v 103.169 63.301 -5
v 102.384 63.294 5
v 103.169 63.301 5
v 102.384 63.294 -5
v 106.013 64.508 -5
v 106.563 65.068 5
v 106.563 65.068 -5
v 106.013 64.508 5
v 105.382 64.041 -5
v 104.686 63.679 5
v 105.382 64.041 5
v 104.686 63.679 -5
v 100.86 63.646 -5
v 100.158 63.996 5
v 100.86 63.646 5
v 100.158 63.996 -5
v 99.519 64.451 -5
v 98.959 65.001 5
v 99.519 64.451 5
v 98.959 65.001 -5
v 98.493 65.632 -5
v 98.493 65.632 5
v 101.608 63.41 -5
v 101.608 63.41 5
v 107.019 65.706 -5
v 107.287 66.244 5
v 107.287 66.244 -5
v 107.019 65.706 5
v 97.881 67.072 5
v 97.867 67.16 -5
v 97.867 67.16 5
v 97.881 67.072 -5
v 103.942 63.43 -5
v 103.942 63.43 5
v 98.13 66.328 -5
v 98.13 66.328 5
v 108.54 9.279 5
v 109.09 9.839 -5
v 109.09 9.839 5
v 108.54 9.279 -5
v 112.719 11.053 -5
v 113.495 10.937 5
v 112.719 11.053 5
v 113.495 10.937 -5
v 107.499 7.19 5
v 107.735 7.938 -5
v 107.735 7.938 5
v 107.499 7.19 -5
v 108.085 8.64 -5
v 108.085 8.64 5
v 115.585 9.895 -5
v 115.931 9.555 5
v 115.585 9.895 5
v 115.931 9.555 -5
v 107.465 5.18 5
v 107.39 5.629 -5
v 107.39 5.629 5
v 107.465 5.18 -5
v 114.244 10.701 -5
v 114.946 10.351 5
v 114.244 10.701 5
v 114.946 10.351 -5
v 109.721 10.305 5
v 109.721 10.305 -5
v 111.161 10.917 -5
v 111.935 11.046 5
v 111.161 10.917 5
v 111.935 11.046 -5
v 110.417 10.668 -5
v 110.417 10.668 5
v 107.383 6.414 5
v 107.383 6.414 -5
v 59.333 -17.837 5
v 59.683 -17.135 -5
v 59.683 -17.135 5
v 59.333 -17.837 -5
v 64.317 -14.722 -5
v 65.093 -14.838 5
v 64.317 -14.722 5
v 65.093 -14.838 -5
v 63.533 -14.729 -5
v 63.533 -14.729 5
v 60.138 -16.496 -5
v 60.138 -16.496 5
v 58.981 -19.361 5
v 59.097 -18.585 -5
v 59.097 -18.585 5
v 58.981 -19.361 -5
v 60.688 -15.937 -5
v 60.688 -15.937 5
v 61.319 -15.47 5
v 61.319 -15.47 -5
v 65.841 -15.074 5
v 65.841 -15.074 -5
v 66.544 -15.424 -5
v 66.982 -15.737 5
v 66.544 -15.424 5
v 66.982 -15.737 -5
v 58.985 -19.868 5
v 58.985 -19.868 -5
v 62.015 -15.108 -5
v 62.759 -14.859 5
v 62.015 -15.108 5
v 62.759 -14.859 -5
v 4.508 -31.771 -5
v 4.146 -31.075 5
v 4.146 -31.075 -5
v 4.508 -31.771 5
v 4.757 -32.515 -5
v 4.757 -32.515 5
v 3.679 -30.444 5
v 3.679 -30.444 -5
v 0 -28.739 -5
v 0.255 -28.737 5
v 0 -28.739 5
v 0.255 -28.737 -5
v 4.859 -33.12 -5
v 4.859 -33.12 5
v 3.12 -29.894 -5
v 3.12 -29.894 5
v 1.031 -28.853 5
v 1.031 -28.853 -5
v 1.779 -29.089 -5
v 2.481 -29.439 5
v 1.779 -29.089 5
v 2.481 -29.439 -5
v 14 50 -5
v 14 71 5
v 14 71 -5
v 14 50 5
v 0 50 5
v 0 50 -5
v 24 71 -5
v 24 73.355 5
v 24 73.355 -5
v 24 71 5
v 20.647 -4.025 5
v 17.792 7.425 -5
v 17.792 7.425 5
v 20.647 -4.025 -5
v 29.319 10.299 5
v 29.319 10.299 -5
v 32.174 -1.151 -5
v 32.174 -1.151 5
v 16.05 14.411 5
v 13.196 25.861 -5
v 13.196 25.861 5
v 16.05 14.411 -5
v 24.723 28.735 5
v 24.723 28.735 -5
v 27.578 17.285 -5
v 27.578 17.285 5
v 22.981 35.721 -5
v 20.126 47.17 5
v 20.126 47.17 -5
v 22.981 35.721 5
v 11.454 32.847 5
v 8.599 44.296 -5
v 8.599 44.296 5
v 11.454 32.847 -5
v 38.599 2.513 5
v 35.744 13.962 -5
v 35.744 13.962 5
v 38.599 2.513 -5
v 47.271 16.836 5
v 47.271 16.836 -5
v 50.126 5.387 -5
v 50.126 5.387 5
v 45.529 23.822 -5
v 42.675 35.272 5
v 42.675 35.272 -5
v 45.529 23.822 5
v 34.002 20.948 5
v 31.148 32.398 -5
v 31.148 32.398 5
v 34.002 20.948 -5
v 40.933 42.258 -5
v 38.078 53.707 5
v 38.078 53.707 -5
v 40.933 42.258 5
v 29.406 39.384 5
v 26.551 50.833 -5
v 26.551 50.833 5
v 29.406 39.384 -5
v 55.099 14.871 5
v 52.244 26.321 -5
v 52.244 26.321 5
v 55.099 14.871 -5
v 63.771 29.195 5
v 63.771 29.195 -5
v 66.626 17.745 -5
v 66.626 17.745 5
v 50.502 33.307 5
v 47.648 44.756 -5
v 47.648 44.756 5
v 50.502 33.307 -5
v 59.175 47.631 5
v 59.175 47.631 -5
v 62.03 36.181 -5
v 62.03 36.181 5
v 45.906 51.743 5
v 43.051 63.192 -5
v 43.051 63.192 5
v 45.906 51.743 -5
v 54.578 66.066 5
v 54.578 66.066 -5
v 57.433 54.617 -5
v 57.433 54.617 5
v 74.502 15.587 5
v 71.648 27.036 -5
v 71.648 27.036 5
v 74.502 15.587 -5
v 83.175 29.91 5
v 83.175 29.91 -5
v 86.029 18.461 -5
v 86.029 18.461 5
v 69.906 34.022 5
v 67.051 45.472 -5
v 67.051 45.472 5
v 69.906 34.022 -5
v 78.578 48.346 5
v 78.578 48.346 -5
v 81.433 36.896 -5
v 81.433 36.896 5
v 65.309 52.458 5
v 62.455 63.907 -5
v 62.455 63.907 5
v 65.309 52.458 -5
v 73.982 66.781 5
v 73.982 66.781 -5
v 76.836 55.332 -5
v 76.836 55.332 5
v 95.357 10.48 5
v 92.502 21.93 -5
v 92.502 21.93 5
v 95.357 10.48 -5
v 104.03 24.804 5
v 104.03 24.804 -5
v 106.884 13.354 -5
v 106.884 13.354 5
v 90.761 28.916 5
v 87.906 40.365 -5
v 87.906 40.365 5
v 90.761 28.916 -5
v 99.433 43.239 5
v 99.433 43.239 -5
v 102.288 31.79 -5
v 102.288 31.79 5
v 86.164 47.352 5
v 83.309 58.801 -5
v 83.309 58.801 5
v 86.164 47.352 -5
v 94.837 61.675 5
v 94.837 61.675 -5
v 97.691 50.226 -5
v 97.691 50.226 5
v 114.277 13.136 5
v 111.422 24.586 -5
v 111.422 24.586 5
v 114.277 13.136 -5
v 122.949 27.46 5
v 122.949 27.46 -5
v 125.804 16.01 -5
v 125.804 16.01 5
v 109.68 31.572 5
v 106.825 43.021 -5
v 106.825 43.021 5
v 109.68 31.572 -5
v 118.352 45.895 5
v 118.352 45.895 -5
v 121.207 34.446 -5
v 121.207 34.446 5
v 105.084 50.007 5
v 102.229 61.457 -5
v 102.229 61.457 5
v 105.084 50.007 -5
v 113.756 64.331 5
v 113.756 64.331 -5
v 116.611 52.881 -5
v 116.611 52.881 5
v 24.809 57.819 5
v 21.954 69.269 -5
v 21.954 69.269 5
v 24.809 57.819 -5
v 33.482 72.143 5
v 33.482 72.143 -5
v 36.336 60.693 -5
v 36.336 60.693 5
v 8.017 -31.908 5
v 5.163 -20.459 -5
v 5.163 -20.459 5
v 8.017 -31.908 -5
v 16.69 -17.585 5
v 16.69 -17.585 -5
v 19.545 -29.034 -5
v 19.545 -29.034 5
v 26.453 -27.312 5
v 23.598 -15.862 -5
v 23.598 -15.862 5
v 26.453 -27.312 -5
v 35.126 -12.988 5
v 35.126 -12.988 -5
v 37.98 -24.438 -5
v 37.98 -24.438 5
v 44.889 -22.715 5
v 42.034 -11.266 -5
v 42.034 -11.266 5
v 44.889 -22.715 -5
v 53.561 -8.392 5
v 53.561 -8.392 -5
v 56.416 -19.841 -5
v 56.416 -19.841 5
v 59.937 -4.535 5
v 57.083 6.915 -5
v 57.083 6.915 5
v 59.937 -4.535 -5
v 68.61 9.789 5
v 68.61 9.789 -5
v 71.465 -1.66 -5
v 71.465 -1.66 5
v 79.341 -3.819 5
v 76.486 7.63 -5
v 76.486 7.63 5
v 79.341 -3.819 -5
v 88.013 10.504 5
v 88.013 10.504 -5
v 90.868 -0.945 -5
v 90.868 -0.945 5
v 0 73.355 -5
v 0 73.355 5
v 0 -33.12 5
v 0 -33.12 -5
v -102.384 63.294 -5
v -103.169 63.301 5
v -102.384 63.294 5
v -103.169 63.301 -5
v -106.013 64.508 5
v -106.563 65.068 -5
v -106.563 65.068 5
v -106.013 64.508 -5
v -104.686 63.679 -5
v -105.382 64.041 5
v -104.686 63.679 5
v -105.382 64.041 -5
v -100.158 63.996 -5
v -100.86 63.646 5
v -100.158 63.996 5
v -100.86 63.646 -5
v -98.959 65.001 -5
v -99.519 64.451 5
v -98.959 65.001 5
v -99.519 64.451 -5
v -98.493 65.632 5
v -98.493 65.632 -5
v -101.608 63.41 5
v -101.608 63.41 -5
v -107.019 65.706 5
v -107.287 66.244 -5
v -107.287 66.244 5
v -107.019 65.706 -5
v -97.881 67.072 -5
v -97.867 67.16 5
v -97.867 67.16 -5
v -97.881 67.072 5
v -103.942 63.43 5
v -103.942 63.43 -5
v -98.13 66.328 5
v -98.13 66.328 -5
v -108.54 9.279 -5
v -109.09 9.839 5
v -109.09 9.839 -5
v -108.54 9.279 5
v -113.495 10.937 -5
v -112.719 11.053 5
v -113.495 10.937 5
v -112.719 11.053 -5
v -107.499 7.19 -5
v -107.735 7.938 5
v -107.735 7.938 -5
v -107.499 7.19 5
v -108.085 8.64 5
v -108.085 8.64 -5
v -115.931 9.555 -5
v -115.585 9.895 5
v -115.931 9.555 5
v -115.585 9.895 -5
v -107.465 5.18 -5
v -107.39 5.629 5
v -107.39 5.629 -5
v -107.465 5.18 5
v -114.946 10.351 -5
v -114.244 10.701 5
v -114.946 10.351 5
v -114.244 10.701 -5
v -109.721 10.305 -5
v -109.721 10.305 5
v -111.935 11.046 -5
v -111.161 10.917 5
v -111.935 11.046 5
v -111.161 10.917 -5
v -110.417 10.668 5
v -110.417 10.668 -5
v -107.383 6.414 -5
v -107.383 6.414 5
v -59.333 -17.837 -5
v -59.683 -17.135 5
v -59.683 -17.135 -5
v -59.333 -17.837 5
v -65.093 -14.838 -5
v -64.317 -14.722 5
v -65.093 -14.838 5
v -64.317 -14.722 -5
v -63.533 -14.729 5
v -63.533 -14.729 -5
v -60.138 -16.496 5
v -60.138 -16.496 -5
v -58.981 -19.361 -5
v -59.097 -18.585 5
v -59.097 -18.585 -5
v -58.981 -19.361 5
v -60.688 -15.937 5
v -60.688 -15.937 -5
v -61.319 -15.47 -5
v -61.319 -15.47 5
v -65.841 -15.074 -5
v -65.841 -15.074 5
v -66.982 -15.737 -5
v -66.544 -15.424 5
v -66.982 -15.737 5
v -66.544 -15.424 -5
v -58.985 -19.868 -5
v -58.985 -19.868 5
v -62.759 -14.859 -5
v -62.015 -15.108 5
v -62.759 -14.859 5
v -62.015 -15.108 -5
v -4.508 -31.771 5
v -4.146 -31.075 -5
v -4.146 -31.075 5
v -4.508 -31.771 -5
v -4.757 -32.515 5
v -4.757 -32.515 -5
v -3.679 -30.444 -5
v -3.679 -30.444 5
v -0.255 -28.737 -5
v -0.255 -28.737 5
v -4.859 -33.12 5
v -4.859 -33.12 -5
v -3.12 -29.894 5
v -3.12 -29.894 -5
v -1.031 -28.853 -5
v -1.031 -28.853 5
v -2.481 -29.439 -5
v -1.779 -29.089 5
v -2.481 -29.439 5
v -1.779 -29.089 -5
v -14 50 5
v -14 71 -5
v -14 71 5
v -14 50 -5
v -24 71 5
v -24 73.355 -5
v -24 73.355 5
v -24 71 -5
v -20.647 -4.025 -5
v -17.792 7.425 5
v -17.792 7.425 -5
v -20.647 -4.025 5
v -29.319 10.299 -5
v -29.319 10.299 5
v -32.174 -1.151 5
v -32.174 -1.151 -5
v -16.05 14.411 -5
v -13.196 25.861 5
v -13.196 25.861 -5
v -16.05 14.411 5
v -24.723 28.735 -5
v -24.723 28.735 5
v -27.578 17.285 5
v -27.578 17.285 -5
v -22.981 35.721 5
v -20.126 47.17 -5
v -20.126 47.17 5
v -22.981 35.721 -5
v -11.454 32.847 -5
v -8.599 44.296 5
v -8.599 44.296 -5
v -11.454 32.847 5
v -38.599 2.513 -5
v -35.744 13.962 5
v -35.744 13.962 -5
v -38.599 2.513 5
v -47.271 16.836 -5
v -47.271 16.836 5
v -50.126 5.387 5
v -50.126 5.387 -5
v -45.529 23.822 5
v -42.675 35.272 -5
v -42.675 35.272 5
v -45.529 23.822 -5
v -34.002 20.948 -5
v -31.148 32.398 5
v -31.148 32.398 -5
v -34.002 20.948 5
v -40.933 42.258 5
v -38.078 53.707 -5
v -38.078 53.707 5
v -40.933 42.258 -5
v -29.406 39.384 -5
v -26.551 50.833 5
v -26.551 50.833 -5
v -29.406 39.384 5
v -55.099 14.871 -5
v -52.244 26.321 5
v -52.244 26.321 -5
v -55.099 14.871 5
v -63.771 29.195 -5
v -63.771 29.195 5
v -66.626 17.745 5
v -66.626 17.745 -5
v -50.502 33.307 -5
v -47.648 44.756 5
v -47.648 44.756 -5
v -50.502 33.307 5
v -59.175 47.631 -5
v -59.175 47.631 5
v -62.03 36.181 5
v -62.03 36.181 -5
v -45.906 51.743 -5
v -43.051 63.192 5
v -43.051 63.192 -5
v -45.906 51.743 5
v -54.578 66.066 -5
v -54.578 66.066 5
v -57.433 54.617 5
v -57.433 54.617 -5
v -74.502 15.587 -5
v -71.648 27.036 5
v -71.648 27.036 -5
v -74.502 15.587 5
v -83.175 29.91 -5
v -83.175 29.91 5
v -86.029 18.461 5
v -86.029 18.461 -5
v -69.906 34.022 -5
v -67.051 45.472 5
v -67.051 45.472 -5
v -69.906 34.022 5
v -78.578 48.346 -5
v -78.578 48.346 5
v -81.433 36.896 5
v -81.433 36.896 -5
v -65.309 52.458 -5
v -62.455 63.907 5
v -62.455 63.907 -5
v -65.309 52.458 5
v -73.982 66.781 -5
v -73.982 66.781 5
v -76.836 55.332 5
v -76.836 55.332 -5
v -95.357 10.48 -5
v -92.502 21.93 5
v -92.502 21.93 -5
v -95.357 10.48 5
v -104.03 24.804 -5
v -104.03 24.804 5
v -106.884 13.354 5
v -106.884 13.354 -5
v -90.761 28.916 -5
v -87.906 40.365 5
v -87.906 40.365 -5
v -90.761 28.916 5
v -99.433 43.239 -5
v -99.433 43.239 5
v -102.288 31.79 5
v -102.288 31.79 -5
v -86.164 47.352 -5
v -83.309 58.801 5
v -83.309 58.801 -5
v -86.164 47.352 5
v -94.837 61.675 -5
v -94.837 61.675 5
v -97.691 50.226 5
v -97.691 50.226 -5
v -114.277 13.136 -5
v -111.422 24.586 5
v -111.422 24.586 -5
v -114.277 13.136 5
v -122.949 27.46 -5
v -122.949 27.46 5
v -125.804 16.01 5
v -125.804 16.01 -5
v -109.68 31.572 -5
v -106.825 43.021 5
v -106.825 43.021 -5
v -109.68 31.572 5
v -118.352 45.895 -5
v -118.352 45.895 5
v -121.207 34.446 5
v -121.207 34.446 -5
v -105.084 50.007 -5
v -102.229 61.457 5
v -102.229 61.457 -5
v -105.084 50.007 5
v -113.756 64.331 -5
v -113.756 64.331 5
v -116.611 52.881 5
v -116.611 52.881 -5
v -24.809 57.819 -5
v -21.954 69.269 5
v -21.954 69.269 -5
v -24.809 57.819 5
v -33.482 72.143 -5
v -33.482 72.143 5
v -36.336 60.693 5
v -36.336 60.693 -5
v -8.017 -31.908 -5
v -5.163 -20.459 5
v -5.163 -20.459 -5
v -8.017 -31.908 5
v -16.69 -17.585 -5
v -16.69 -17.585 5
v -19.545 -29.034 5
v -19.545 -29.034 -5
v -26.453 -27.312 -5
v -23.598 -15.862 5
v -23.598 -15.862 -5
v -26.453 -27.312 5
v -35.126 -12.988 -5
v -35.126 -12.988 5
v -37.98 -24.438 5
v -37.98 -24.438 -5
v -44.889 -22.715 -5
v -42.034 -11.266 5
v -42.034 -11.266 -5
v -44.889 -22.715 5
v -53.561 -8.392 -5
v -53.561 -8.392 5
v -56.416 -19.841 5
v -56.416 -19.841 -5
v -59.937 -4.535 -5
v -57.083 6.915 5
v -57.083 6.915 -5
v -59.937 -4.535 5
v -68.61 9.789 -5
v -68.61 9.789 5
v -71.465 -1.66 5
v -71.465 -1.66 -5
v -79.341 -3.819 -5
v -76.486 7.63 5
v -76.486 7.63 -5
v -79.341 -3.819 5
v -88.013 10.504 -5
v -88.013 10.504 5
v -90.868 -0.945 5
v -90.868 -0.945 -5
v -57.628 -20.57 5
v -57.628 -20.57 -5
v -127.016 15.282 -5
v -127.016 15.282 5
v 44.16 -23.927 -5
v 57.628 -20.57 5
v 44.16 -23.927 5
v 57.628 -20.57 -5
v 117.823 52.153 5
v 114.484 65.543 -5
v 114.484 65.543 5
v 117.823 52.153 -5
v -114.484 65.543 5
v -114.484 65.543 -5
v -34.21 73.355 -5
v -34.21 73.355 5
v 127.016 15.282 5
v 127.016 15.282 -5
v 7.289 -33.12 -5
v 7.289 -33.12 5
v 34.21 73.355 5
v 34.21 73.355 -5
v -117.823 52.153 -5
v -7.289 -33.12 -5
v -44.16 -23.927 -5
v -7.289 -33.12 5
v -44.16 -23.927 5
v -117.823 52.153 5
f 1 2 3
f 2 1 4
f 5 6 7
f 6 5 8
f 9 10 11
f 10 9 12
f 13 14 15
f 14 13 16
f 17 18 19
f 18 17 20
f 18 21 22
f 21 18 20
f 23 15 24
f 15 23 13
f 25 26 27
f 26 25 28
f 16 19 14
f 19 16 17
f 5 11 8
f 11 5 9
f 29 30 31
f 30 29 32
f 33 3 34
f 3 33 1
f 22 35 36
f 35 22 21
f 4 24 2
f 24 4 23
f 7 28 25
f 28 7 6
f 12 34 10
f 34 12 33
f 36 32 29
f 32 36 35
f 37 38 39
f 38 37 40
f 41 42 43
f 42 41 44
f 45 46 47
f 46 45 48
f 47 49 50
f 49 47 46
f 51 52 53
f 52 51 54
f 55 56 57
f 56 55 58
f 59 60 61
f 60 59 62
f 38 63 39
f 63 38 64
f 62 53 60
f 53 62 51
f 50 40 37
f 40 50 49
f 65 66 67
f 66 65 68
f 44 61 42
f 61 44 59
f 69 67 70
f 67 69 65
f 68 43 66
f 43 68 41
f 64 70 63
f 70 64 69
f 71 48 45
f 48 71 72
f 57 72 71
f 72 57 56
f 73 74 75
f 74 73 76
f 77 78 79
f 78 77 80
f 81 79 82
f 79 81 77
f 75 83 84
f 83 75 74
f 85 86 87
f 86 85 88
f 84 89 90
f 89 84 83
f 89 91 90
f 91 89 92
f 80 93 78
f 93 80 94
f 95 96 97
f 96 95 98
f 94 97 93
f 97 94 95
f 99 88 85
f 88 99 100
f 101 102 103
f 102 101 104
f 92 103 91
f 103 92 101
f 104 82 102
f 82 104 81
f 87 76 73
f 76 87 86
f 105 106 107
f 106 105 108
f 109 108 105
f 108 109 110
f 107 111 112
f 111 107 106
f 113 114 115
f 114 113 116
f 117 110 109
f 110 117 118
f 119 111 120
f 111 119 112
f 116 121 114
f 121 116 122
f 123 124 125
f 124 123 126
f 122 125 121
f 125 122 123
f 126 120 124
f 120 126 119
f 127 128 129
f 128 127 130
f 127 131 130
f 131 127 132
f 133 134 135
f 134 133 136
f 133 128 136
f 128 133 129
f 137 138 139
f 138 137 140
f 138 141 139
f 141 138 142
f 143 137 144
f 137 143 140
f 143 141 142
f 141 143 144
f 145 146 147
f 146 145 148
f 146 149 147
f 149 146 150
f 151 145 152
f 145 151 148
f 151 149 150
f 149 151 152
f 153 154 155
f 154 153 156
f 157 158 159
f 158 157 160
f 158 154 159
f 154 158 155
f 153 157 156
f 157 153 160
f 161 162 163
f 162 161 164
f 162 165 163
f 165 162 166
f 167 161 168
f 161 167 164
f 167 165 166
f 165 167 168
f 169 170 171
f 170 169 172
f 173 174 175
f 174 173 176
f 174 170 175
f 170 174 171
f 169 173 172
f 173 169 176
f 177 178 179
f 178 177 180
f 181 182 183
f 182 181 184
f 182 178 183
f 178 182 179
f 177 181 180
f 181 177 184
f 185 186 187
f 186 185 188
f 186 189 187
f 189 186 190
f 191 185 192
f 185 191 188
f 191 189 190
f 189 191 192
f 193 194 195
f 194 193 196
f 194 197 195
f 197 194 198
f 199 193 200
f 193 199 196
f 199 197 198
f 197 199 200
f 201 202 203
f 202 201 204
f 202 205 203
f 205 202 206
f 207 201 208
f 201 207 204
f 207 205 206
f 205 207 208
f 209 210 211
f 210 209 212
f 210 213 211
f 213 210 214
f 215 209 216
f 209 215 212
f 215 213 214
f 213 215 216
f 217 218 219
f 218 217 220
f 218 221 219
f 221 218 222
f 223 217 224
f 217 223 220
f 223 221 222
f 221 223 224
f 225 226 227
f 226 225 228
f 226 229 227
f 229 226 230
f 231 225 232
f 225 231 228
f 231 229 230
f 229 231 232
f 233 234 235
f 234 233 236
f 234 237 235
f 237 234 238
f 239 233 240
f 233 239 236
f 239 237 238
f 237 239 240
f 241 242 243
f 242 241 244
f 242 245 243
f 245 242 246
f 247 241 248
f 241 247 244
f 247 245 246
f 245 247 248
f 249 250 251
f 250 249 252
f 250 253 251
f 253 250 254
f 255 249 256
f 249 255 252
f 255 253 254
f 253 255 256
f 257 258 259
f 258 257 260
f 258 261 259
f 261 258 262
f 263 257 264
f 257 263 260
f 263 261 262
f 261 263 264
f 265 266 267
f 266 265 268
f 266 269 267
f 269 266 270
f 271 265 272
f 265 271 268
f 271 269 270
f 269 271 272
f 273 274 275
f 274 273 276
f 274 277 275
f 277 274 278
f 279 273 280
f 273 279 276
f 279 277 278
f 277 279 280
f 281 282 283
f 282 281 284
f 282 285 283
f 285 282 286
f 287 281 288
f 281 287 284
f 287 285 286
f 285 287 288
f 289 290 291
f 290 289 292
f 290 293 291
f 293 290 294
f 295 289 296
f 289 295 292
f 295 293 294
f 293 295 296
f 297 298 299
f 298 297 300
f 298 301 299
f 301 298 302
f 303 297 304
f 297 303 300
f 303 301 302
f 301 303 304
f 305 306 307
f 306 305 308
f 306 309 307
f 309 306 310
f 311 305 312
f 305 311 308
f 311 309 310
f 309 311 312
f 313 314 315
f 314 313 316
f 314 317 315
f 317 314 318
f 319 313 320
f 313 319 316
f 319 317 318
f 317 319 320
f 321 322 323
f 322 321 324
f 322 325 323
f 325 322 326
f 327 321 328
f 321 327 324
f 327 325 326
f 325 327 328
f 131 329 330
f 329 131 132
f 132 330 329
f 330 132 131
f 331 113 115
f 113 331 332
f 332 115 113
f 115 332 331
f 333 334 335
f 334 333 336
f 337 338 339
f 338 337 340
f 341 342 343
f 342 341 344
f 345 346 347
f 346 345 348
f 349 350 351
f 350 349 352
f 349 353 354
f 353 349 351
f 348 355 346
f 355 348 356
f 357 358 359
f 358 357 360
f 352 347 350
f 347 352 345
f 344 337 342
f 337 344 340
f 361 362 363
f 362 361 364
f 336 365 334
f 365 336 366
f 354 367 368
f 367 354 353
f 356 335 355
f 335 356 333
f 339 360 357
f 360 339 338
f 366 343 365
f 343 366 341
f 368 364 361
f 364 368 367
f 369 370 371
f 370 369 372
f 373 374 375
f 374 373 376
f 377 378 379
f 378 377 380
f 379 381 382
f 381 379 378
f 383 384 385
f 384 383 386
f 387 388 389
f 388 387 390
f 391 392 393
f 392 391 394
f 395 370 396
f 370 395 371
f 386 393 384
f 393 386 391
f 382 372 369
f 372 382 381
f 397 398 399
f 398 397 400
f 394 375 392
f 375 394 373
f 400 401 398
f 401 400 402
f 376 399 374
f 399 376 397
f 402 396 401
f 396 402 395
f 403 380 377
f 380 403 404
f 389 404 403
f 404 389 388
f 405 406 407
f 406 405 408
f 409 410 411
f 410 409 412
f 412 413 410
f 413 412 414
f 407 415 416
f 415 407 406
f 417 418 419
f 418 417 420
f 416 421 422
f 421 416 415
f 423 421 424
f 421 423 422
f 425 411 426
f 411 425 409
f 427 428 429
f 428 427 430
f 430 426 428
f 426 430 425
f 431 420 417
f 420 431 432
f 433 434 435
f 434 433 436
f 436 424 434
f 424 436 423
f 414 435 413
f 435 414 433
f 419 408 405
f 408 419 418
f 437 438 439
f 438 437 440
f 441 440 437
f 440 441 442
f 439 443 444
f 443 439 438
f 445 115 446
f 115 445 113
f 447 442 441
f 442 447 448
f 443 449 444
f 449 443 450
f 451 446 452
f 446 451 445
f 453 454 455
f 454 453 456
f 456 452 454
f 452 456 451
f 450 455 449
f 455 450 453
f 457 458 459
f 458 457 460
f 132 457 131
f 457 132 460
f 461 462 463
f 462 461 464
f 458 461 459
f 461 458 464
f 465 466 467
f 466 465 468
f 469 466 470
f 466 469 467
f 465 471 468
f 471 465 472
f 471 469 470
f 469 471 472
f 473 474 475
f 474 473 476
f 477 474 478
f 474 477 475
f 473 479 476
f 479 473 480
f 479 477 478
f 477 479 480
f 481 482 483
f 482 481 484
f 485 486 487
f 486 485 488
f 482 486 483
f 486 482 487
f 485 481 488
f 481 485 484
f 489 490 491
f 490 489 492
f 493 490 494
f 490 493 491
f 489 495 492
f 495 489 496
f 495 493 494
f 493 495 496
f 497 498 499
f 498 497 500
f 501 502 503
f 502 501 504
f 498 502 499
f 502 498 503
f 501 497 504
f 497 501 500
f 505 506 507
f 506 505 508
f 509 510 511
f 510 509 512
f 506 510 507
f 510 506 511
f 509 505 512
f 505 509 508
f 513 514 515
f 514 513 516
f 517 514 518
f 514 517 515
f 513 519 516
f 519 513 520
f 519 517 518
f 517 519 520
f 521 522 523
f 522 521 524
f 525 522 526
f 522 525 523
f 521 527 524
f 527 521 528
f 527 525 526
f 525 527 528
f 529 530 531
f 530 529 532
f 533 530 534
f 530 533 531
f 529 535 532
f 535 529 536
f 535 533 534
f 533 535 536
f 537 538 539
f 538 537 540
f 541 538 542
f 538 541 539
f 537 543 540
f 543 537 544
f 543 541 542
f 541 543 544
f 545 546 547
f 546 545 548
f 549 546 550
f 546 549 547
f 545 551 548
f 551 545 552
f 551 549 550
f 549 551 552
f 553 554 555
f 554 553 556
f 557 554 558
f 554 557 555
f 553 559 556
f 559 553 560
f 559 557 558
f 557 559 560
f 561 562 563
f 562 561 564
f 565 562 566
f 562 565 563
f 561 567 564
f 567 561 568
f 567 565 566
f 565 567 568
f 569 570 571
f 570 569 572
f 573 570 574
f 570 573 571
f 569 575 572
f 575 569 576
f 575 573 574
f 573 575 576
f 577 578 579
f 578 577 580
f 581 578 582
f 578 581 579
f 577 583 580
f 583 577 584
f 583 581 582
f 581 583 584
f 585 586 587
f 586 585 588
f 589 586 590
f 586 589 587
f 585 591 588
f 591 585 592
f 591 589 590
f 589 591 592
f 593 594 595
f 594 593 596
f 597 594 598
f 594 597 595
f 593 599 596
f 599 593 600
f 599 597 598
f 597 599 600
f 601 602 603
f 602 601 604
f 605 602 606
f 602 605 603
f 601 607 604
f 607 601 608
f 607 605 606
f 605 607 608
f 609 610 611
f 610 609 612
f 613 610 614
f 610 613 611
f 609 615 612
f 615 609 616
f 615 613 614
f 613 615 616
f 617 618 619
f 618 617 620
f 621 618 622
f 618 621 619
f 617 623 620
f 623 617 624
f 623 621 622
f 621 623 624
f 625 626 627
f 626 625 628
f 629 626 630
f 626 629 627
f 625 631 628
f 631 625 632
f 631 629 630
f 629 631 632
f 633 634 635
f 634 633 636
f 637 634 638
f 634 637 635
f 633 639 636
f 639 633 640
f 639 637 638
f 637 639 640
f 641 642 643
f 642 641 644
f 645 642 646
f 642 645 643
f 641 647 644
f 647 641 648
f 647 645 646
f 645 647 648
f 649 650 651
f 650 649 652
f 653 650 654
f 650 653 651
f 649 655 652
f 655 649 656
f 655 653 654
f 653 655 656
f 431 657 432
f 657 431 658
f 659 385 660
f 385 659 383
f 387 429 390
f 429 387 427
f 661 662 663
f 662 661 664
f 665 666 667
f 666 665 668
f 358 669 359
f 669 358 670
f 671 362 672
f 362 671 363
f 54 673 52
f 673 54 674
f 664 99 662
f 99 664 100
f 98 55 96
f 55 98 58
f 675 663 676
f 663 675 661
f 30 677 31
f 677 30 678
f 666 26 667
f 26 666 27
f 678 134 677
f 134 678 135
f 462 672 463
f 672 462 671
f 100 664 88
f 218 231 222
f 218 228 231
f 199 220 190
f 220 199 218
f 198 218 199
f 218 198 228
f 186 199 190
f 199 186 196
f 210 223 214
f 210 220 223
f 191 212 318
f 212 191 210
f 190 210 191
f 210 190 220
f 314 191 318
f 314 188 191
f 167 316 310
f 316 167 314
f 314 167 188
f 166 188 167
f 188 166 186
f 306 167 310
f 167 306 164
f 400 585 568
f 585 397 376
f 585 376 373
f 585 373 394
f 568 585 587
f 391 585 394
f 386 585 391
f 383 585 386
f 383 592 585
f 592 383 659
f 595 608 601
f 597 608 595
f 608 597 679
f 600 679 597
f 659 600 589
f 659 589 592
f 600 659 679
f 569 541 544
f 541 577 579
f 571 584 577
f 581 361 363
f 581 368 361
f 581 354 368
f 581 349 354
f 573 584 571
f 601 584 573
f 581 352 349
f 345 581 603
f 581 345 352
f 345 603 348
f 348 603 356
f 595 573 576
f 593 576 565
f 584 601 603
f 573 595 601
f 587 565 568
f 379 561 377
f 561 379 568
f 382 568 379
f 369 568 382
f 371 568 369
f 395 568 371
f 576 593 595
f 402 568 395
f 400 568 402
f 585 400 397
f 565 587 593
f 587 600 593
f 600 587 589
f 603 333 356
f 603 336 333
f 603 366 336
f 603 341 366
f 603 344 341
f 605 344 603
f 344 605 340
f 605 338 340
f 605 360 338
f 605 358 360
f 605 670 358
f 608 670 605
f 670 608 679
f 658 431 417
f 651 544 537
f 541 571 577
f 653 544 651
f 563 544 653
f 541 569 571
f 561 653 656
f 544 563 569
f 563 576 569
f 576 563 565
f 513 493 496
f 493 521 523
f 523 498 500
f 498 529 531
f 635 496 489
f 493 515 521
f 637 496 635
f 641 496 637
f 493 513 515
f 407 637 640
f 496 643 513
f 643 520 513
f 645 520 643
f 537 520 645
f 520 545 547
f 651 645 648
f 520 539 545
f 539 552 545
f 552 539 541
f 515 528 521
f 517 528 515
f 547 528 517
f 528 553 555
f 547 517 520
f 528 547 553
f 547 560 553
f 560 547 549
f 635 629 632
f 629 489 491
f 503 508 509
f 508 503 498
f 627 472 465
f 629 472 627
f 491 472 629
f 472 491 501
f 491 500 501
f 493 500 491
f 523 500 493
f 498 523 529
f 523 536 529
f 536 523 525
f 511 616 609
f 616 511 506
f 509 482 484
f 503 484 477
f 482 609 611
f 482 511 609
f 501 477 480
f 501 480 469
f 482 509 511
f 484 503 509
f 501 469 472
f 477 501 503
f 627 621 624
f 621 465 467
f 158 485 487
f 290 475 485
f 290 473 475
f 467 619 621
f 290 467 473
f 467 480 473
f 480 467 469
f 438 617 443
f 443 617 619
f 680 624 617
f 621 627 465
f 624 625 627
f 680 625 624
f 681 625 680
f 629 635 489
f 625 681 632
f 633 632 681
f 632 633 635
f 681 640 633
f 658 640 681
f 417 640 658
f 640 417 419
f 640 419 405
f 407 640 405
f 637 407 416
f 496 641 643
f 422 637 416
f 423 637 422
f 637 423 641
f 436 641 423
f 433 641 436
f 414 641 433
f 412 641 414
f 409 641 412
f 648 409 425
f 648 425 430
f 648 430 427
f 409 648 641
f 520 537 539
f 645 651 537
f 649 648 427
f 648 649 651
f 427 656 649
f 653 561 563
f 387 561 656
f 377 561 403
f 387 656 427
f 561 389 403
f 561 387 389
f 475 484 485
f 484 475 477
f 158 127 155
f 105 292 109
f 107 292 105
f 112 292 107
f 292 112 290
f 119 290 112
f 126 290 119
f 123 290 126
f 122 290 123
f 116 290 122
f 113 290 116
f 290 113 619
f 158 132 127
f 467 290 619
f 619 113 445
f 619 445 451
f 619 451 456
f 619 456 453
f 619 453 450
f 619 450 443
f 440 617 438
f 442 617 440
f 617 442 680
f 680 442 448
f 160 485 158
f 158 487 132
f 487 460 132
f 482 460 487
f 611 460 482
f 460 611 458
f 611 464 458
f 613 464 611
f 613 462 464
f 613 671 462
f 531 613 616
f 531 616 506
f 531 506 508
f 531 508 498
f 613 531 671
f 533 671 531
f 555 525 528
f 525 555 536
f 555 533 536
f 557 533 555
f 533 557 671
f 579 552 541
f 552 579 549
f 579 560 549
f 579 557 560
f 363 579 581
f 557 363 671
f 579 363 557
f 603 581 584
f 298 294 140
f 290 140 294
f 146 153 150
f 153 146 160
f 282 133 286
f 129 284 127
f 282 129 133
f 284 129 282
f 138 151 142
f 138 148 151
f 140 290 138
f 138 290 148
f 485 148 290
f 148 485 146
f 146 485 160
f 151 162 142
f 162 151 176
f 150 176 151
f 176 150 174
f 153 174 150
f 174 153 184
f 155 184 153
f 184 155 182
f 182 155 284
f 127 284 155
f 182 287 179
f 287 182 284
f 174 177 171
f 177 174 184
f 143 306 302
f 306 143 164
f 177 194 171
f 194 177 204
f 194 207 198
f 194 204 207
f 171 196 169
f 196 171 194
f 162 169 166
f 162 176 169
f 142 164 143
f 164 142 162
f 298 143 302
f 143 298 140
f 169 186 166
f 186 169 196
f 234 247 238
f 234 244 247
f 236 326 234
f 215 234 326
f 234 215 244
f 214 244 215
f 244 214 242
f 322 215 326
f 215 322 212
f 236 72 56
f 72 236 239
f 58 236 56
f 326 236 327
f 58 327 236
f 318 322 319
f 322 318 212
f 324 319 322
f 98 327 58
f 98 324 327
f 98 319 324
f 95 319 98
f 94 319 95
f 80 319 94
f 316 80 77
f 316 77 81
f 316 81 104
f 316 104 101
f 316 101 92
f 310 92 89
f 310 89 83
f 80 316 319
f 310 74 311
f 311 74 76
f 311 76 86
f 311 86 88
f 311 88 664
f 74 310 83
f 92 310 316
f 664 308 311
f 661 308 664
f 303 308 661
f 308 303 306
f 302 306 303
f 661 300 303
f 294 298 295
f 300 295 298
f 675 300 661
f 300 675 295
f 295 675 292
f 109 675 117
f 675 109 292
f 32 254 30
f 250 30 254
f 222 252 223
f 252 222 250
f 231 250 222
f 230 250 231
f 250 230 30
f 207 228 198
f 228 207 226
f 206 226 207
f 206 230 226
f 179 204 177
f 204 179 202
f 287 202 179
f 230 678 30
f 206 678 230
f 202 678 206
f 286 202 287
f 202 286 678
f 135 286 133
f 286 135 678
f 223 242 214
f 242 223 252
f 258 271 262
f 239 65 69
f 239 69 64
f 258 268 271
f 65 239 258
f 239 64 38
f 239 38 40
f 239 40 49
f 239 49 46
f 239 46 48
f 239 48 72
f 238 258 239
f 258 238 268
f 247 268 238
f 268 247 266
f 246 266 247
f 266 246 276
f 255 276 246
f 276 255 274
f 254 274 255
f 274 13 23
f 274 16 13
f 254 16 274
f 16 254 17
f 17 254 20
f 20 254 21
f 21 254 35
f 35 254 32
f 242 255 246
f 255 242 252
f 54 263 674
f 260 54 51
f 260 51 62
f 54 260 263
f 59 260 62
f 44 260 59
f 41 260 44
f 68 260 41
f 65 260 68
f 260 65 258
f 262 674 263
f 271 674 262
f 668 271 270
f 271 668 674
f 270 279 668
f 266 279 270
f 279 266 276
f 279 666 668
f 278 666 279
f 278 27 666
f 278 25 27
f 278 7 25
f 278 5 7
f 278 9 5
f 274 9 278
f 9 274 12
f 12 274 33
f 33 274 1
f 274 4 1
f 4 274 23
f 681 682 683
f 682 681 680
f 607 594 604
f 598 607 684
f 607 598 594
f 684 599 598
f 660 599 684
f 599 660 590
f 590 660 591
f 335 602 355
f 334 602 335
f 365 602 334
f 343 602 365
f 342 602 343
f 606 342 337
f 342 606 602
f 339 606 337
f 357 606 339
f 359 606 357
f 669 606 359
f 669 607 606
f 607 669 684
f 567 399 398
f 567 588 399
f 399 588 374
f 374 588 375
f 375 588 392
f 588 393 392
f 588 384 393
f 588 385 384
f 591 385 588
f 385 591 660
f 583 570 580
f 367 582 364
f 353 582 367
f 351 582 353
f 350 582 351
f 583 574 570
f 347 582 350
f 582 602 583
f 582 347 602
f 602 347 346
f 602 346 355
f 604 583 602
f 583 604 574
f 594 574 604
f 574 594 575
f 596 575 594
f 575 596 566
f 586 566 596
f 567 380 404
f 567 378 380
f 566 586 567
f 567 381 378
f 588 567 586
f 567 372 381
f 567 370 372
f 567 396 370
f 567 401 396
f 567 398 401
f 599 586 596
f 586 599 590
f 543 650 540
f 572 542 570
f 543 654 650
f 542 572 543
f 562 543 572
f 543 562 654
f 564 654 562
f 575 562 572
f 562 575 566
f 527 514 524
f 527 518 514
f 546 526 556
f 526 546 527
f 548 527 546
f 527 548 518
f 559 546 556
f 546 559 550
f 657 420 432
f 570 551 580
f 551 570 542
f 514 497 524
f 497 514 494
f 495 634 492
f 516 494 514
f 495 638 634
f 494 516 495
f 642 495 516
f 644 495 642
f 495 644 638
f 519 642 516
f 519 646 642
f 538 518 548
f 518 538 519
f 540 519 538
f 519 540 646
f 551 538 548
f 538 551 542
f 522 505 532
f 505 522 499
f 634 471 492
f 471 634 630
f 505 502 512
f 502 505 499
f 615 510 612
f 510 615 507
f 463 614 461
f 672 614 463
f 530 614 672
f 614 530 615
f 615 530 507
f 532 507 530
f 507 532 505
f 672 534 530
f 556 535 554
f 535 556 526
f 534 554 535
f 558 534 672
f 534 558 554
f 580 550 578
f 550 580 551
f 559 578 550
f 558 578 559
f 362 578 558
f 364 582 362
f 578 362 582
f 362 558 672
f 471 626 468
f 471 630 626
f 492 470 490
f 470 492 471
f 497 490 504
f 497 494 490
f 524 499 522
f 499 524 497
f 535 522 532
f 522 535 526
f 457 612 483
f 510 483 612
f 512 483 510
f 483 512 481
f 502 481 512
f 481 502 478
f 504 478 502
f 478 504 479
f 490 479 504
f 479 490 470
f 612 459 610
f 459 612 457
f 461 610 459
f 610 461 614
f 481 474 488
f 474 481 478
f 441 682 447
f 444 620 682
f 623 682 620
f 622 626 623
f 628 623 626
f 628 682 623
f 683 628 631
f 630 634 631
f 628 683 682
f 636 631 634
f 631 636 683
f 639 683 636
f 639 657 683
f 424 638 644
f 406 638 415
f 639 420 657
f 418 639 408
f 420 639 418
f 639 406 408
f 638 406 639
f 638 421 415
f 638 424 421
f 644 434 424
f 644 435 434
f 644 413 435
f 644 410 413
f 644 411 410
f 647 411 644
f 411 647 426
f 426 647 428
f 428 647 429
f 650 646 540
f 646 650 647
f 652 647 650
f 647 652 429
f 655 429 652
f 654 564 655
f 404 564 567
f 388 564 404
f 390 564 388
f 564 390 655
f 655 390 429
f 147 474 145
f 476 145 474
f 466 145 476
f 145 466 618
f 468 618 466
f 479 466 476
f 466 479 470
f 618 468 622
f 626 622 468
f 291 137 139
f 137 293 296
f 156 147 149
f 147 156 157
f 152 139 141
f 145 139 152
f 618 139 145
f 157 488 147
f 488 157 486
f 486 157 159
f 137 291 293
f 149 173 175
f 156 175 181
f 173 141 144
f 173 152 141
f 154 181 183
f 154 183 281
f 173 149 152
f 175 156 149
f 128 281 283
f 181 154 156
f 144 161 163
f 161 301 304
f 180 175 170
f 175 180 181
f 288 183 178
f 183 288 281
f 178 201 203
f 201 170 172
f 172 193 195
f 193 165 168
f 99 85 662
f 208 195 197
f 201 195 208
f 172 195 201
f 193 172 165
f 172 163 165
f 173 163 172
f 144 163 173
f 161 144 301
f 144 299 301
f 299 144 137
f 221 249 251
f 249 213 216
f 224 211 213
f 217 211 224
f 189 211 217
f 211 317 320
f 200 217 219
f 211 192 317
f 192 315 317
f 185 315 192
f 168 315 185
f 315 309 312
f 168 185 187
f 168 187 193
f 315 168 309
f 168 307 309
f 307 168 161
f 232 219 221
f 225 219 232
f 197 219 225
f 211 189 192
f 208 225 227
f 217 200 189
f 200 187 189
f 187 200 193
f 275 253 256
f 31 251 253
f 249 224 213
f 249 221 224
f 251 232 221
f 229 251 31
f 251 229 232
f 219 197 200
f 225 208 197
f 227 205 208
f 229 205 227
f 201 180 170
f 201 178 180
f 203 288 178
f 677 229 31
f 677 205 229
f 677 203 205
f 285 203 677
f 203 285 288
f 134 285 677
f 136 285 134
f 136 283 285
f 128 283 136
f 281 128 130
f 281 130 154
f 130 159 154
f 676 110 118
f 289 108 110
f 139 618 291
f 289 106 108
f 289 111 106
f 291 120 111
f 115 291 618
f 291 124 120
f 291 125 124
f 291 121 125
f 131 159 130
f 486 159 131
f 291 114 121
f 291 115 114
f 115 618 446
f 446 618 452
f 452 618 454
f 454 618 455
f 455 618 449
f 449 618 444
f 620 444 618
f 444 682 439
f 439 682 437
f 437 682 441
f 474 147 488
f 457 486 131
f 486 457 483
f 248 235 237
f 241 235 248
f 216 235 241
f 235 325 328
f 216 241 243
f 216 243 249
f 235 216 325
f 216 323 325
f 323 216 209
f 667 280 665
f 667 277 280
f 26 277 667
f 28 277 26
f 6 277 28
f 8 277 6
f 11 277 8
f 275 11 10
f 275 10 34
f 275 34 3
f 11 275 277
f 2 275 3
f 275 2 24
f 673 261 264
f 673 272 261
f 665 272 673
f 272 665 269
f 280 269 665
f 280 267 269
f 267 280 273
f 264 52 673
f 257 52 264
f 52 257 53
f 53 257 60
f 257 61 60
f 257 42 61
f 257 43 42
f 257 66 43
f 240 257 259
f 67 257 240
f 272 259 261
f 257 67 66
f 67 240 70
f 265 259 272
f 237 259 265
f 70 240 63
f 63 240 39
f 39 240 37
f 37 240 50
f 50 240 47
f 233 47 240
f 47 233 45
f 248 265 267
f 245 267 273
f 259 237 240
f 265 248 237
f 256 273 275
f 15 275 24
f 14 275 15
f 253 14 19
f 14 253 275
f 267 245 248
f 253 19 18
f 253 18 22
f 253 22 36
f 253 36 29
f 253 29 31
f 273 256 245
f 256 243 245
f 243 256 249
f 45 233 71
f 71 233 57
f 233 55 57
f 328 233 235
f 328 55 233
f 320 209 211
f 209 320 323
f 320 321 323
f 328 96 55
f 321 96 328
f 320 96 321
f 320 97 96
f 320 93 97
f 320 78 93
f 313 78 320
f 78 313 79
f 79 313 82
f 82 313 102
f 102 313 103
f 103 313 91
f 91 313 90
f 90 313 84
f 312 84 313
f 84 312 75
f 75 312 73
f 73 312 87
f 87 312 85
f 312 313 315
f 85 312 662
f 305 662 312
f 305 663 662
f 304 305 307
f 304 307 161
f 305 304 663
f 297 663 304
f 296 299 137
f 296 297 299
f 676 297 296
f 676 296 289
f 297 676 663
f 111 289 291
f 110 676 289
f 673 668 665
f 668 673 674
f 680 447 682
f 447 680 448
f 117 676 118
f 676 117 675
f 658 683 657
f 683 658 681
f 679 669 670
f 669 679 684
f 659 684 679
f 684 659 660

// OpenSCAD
difference () {
  hull () {
    union () {
      difference () {
        union () {
          rotate (a=14.0, v=[0, 0, 1]) {
            translate ([25.0, -3.0, 0]) {
              cube ([13.88, 13.8, 10], center=true);
            }
          }
          rotate (a=14.0, v=[0, 0, 1]) {
            translate ([25.0, 16.0, 0]) {
              cube ([13.88, 13.8, 10], center=true);
            }
          }
          rotate (a=14.0, v=[0, 0, 1]) {
            translate ([25.0, 35.0, 0]) {
              cube ([13.88, 13.8, 10], center=true);
            }
          }
          rotate (a=14.0, v=[0, 0, 1]) {
            translate ([44.0, -1.0, 0]) {
              cube ([13.88, 13.8, 10], center=true);
            }
          }
          rotate (a=14.0, v=[0, 0, 1]) {
            translate ([44.0, 18.0, 0]) {
              cube ([13.88, 13.8, 10], center=true);
            }
          }
          rotate (a=14.0, v=[0, 0, 1]) {
            translate ([44.0, 37.0, 0]) {
              cube ([13.88, 13.8, 10], center=true);
            }
          }
          rotate (a=14.0, v=[0, 0, 1]) {
            translate ([63.0, 7.0, 0]) {
              cube ([13.88, 13.8, 10], center=true);
            }
          }
          rotate (a=14.0, v=[0, 0, 1]) {
            translate ([63.0, 26.0, 0]) {
              cube ([13.88, 13.8, 10], center=true);
            }
          }
          rotate (a=14.0, v=[0, 0, 1]) {
            translate ([63.0, 45.0, 0]) {
              cube ([13.88, 13.8, 10], center=true);
            }
          }
          rotate (a=14.0, v=[0, 0, 1]) {
            translate ([82.0, 3.0, 0]) {
              cube ([13.88, 13.8, 10], center=true);
            }
          }
          rotate (a=14.0, v=[0, 0, 1]) {
            translate ([82.0, 22.0, 0]) {
              cube ([13.88, 13.8, 10], center=true);
            }
          }
          rotate (a=14.0, v=[0, 0, 1]) {
            translate ([82.0, 41.0, 0]) {
              cube ([13.88, 13.8, 10], center=true);
            }
          }
          rotate (a=14.0, v=[0, 0, 1]) {
            translate ([101.0, -7.0, 0]) {
              cube ([13.88, 13.8, 10], center=true);
            }
          }
          rotate (a=14.0, v=[0, 0, 1]) {
            translate ([101.0, 12.0, 0]) {
              cube ([13.88, 13.8, 10], center=true);
            }
          }
          rotate (a=14.0, v=[0, 0, 1]) {
            translate ([101.0, 31.0, 0]) {
              cube ([13.88, 13.8, 10], center=true);
            }
          }
          rotate (a=14.0, v=[0, 0, 1]) {
            translate ([120.0, -9.0, 0]) {
              cube ([13.88, 13.8, 10], center=true);
            }
          }
          rotate (a=14.0, v=[0, 0, 1]) {
            translate ([120.0, 10.0, 0]) {
              cube ([13.88, 13.8, 10], center=true);
            }
          }
          rotate (a=14.0, v=[0, 0, 1]) {
            translate ([120.0, 29.0, 0]) {
              cube ([13.88, 13.8, 10], center=true);
            }
          }
          rotate (a=14.0, v=[0, 0, 1]) {
            translate ([44.0, 56.0, 0]) {
              cube ([13.88, 13.8, 10], center=true);
            }
          }
          rotate (a=14.0, v=[0, 0, 1]) {
            translate ([6.0, -27.0, 0]) {
              cube ([13.88, 13.8, 10], center=true);
            }
          }
          rotate (a=14.0, v=[0, 0, 1]) {
            translate ([25.0, -27.0, 0]) {
              cube ([13.88, 13.8, 10], center=true);
            }
          }
          rotate (a=14.0, v=[0, 0, 1]) {
            translate ([44.0, -27.0, 0]) {
              cube ([13.88, 13.8, 10], center=true);
            }
          }
          rotate (a=14.0, v=[0, 0, 1]) {
            translate ([63.0, -13.0, 0]) {
              cube ([13.88, 13.8, 10], center=true);
            }
          }
          rotate (a=14.0, v=[0, 0, 1]) {
            translate ([82.0, -17.0, 0]) {
              cube ([13.88, 13.8, 10], center=true);
            }
          }
        }
        translate ([-500, 0, 0]) {
          cube ([1000, 1000, 1000], center=true);
        }
      }
      mirror ([1, 0, 0]) {
        difference () {
          union () {
            rotate (a=14.0, v=[0, 0, 1]) {
              translate ([25.0, -3.0, 0]) {
                cube ([13.88, 13.8, 10], center=true);
              }
            }
            rotate (a=14.0, v=[0, 0, 1]) {
              translate ([25.0, 16.0, 0]) {
                cube ([13.88, 13.8, 10], center=true);
              }
            }
            rotate (a=14.0, v=[0, 0, 1]) {
              translate ([25.0, 35.0, 0]) {
                cube ([13.88, 13.8, 10], center=true);
              }
            }
            rotate (a=14.0, v=[0, 0, 1]) {
              translate ([44.0, -1.0, 0]) {
                cube ([13.88, 13.8, 10], center=true);
              }
            }
            rotate (a=14.0, v=[0, 0, 1]) {
              translate ([44.0, 18.0, 0]) {
                cube ([13.88, 13.8, 10], center=true);
              }
            }
            rotate (a=14.0, v=[0, 0, 1]) {
              translate ([44.0, 37.0, 0]) {
                cube ([13.88, 13.8, 10], center=true);
              }
            }
            rotate (a=14.0, v=[0, 0, 1]) {
              translate ([63.0, 7.0, 0]) {
                cube ([13.88, 13.8, 10], center=true);
              }
            }
            rotate (a=14.0, v=[0, 0, 1]) {
              translate ([63.0, 26.0, 0]) {
                cube ([13.88, 13.8, 10], center=true);
              }
            }
            rotate (a=14.0, v=[0, 0, 1]) {
              translate ([63.0, 45.0, 0]) {
                cube ([13.88, 13.8, 10], center=true);
              }
            }
            rotate (a=14.0, v=[0, 0, 1]) {
              translate ([82.0, 3.0, 0]) {
                cube ([13.88, 13.8, 10], center=true);
              }
            }
            rotate (a=14.0, v=[0, 0, 1]) {
              translate ([82.0, 22.0, 0]) {
                cube ([13.88, 13.8, 10], center=true);
              }
            }
            rotate (a=14.0, v=[0, 0, 1]) {
              translate ([82.0, 41.0, 0]) {
                cube ([13.88, 13.8, 10], center=true);
              }
            }
            rotate (a=14.0, v=[0, 0, 1]) {
              translate ([101.0, -7.0, 0]) {
                cube ([13.88, 13.8, 10], center=true);
              }
            }
            rotate (a=14.0, v=[0, 0, 1]) {
              translate ([101.0, 12.0, 0]) {
                cube ([13.88, 13.8, 10], center=true);
              }
            }
            rotate (a=14.0, v=[0, 0, 1]) {
              translate ([101.0, 31.0, 0]) {
                cube ([13.88, 13.8, 10], center=true);
              }
            }
            rotate (a=14.0, v=[0, 0, 1]) {
              translate ([120.0, -9.0, 0]) {
                cube ([13.88, 13.8, 10], center=true);
              }
            }
            rotate (a=14.0, v=[0, 0, 1]) {
              translate ([120.0, 10.0, 0]) {
                cube ([13.88, 13.8, 10], center=true);
              }
            }
            rotate (a=14.0, v=[0, 0, 1]) {
              translate ([120.0, 29.0, 0]) {
                cube ([13.88, 13.8, 10], center=true);
              }
            }
            rotate (a=14.0, v=[0, 0, 1]) {
              translate ([44.0, 56.0, 0]) {
                cube ([13.88, 13.8, 10], center=true);
              }
            }
            rotate (a=14.0, v=[0, 0, 1]) {
              translate ([6.0, -27.0, 0]) {
                cube ([13.88, 13.8, 10], center=true);
              }
            }
            rotate (a=14.0, v=[0, 0, 1]) {
              translate ([25.0, -27.0, 0]) {
                cube ([13.88, 13.8, 10], center=true);
              }
            }
            rotate (a=14.0, v=[0, 0, 1]) {
              translate ([44.0, -27.0, 0]) {
                cube ([13.88, 13.8, 10], center=true);
              }
            }
            rotate (a=14.0, v=[0, 0, 1]) {
              translate ([63.0, -13.0, 0]) {
                cube ([13.88, 13.8, 10], center=true);
              }
            }
            rotate (a=14.0, v=[0, 0, 1]) {
              translate ([82.0, -17.0, 0]) {
                cube ([13.88, 13.8, 10], center=true);
              }
            }
          }
          translate ([-500, 0, 0]) {
            cube ([1000, 1000, 1000], center=true);
          }
        }
      }
    }
  }
  scale ([1, 1, 10]) {
    union () {
      difference () {
        union () {
          union () {
            rotate (a=14.0, v=[0, 0, 1]) {
              translate ([116.2, 41.4, 0]) {
                cylinder ($fa=2, $fn=40, $fs=0.1, h=1.5, r=5, center=true);
              }
            }
            rotate (a=14.0, v=[0, 0, 1]) {
              translate ([110.5, -21.299999999999997, 0]) {
                cylinder ($fa=2, $fn=40, $fs=0.1, h=1.5, r=5, center=true);
              }
            }
            rotate (a=14.0, v=[0, 0, 1]) {
              translate ([57.3, -34.599999999999994, 0]) {
                cylinder ($fa=2, $fn=40, $fs=0.1, h=1.5, r=5, center=true);
              }
            }
            rotate (a=14.0, v=[0, 0, 1]) {
              translate ([44.0, 69.89999999999999, 0]) {
                cylinder ($fa=2, $fn=40, $fs=0.1, h=1.5, r=5, center=true);
              }
            }
            rotate (a=14.0, v=[0, 0, 1]) {
              translate ([-8.25, -32.7, 0]) {
                cylinder ($fa=2, $fn=40, $fs=0.1, h=1.5, r=5, center=true);
              }
            }
            translate ([0, 65, 0]) {
              cube ([28, 30, 5], center=true);
            }
            translate ([18, 75, 0]) {
              cube ([12, 8, 5], center=true);
            }
            rotate (a=14.0, v=[0, 0, 1]) {
              translate ([25.0, -3.0, 0]) {
                cube ([11.88, 11.8, 10], center=true);
              }
            }
            rotate (a=14.0, v=[0, 0, 1]) {
              translate ([25.0, 16.0, 0]) {
                cube ([11.88, 11.8, 10], center=true);
              }
            }
            rotate (a=14.0, v=[0, 0, 1]) {
              translate ([25.0, 35.0, 0]) {
                cube ([11.88, 11.8, 10], center=true);
              }
            }
            rotate (a=14.0, v=[0, 0, 1]) {
              translate ([44.0, -1.0, 0]) {
                cube ([11.88, 11.8, 10], center=true);
              }
            }
            rotate (a=14.0, v=[0, 0, 1]) {
              translate ([44.0, 18.0, 0]) {
                cube ([11.88, 11.8, 10], center=true);
              }
            }
            rotate (a=14.0, v=[0, 0, 1]) {
              translate ([44.0, 37.0, 0]) {
                cube ([11.88, 11.8, 10], center=true);
              }
            }
            rotate (a=14.0, v=[0, 0, 1]) {
              translate ([63.0, 7.0, 0]) {
                cube ([11.88, 11.8, 10], center=true);
              }
            }
            rotate (a=14.0, v=[0, 0, 1]) {
              translate ([63.0, 26.0, 0]) {
                cube ([11.88, 11.8, 10], center=true);
              }
            }
            rotate (a=14.0, v=[0, 0, 1]) {
              translate ([63.0, 45.0, 0]) {
                cube ([11.88, 11.8, 10], center=true);
              }
            }
            rotate (a=14.0, v=[0, 0, 1]) {
              translate ([82.0, 3.0, 0]) {
                cube ([11.88, 11.8, 10], center=true);
              }
            }
            rotate (a=14.0, v=[0, 0, 1]) {
              translate ([82.0, 22.0, 0]) {
                cube ([11.88, 11.8, 10], center=true);
              }
            }
            rotate (a=14.0, v=[0, 0, 1]) {
              translate ([82.0, 41.0, 0]) {
                cube ([11.88, 11.8, 10], center=true);
              }
            }
            rotate (a=14.0, v=[0, 0, 1]) {
              translate ([101.0, -7.0, 0]) {
                cube ([11.88, 11.8, 10], center=true);
              }
            }
            rotate (a=14.0, v=[0, 0, 1]) {
              translate ([101.0, 12.0, 0]) {
                cube ([11.88, 11.8, 10], center=true);
              }
            }
            rotate (a=14.0, v=[0, 0, 1]) {
              translate ([101.0, 31.0, 0]) {
                cube ([11.88, 11.8, 10], center=true);
              }
            }
            rotate (a=14.0, v=[0, 0, 1]) {
              translate ([120.0, -9.0, 0]) {
                cube ([11.88, 11.8, 10], center=true);
              }
            }
            rotate (a=14.0, v=[0, 0, 1]) {
              translate ([120.0, 10.0, 0]) {
                cube ([11.88, 11.8, 10], center=true);
              }
            }
            rotate (a=14.0, v=[0, 0, 1]) {
              translate ([120.0, 29.0, 0]) {
                cube ([11.88, 11.8, 10], center=true);
              }
            }
            rotate (a=14.0, v=[0, 0, 1]) {
              translate ([44.0, 56.0, 0]) {
                cube ([11.88, 11.8, 10], center=true);
              }
            }
            rotate (a=14.0, v=[0, 0, 1]) {
              translate ([6.0, -27.0, 0]) {
                cube ([11.88, 11.8, 10], center=true);
              }
            }
            rotate (a=14.0, v=[0, 0, 1]) {
              translate ([25.0, -27.0, 0]) {
                cube ([11.88, 11.8, 10], center=true);
              }
            }
            rotate (a=14.0, v=[0, 0, 1]) {
              translate ([44.0, -27.0, 0]) {
                cube ([11.88, 11.8, 10], center=true);
              }
            }
            rotate (a=14.0, v=[0, 0, 1]) {
              translate ([63.0, -13.0, 0]) {
                cube ([11.88, 11.8, 10], center=true);
              }
            }
            rotate (a=14.0, v=[0, 0, 1]) {
              translate ([82.0, -17.0, 0]) {
                cube ([11.88, 11.8, 10], center=true);
              }
            }
          }
        }
        translate ([-500, 0, 0]) {
          cube ([1000, 1000, 1000], center=true);
        }
      }
      mirror ([1, 0, 0]) {
        difference () {
          union () {
            union () {
              rotate (a=14.0, v=[0, 0, 1]) {
                translate ([116.2, 41.4, 0]) {
                  cylinder ($fa=2, $fn=40, $fs=0.1, h=1.5, r=5, center=true);
                }
              }
              rotate (a=14.0, v=[0, 0, 1]) {
                translate ([110.5, -21.299999999999997, 0]) {
                  cylinder ($fa=2, $fn=40, $fs=0.1, h=1.5, r=5, center=true);
                }
              }
              rotate (a=14.0, v=[0, 0, 1]) {
                translate ([57.3, -34.599999999999994, 0]) {
                  cylinder ($fa=2, $fn=40, $fs=0.1, h=1.5, r=5, center=true);
                }
              }
              rotate (a=14.0, v=[0, 0, 1]) {
                translate ([44.0, 69.89999999999999, 0]) {
                  cylinder ($fa=2, $fn=40, $fs=0.1, h=1.5, r=5, center=true);
                }
              }
              rotate (a=14.0, v=[0, 0, 1]) {
                translate ([-8.25, -32.7, 0]) {
                  cylinder ($fa=2, $fn=40, $fs=0.1, h=1.5, r=5, center=true);
                }
              }
              translate ([0, 65, 0]) {
                cube ([28, 30, 5], center=true);
              }
              translate ([18, 75, 0]) {
                cube ([12, 8, 5], center=true);
              }
              rotate (a=14.0, v=[0, 0, 1]) {
                translate ([25.0, -3.0, 0]) {
                  cube ([11.88, 11.8, 10], center=true);
                }
              }
              rotate (a=14.0, v=[0, 0, 1]) {
                translate ([25.0, 16.0, 0]) {
                  cube ([11.88, 11.8, 10], center=true);
                }
              }
              rotate (a=14.0, v=[0, 0, 1]) {
                translate ([25.0, 35.0, 0]) {
                  cube ([11.88, 11.8, 10], center=true);
                }
              }
              rotate (a=14.0, v=[0, 0, 1]) {
                translate ([44.0, -1.0, 0]) {
                  cube ([11.88, 11.8, 10], center=true);
                }
              }
              rotate (a=14.0, v=[0, 0, 1]) {
                translate ([44.0, 18.0, 0]) {
                  cube ([11.88, 11.8, 10], center=true);
                }
              }
              rotate (a=14.0, v=[0, 0, 1]) {
                translate ([44.0, 37.0, 0]) {
                  cube ([11.88, 11.8, 10], center=true);
                }
              }
              rotate (a=14.0, v=[0, 0, 1]) {
                translate ([63.0, 7.0, 0]) {
                  cube ([11.88, 11.8, 10], center=true);
                }
              }
              rotate (a=14.0, v=[0, 0, 1]) {
                translate ([63.0, 26.0, 0]) {
                  cube ([11.88, 11.8, 10], center=true);
                }
              }
              rotate (a=14.0, v=[0, 0, 1]) {
                translate ([63.0, 45.0, 0]) {
                  cube ([11.88, 11.8, 10], center=true);
                }
              }
              rotate (a=14.0, v=[0, 0, 1]) {
                translate ([82.0, 3.0, 0]) {
                  cube ([11.88, 11.8, 10], center=true);
                }
              }
              rotate (a=14.0, v=[0, 0, 1]) {
                translate ([82.0, 22.0, 0]) {
                  cube ([11.88, 11.8, 10], center=true);
                }
              }
              rotate (a=14.0, v=[0, 0, 1]) {
                translate ([82.0, 41.0, 0]) {
                  cube ([11.88, 11.8, 10], center=true);
                }
              }
              rotate (a=14.0, v=[0, 0, 1]) {
                translate ([101.0, -7.0, 0]) {
                  cube ([11.88, 11.8, 10], center=true);
                }
              }
              rotate (a=14.0, v=[0, 0, 1]) {
                translate ([101.0, 12.0, 0]) {
                  cube ([11.88, 11.8, 10], center=true);
                }
              }
              rotate (a=14.0, v=[0, 0, 1]) {
                translate ([101.0, 31.0, 0]) {
                  cube ([11.88, 11.8, 10], center=true);
                }
              }
              rotate (a=14.0, v=[0, 0, 1]) {
                translate ([120.0, -9.0, 0]) {
                  cube ([11.88, 11.8, 10], center=true);
                }
              }
              rotate (a=14.0, v=[0, 0, 1]) {
                translate ([120.0, 10.0, 0]) {
                  cube ([11.88, 11.8, 10], center=true);
                }
              }
              rotate (a=14.0, v=[0, 0, 1]) {
                translate ([120.0, 29.0, 0]) {
                  cube ([11.88, 11.8, 10], center=true);
                }
              }
              rotate (a=14.0, v=[0, 0, 1]) {
                translate ([44.0, 56.0, 0]) {
                  cube ([11.88, 11.8, 10], center=true);
                }
              }
              rotate (a=14.0, v=[0, 0, 1]) {
                translate ([6.0, -27.0, 0]) {
                  cube ([11.88, 11.8, 10], center=true);
                }
              }
              rotate (a=14.0, v=[0, 0, 1]) {
                translate ([25.0, -27.0, 0]) {
                  cube ([11.88, 11.8, 10], center=true);
                }
              }
              rotate (a=14.0, v=[0, 0, 1]) {
                translate ([44.0, -27.0, 0]) {
                  cube ([11.88, 11.8, 10], center=true);
                }
              }
              rotate (a=14.0, v=[0, 0, 1]) {
                translate ([63.0, -13.0, 0]) {
                  cube ([11.88, 11.8, 10], center=true);
                }
              }
              rotate (a=14.0, v=[0, 0, 1]) {
                translate ([82.0, -17.0, 0]) {
                  cube ([11.88, 11.8, 10], center=true);
                }
              }
            }
          }
          translate ([-500, 0, 0]) {
            cube ([1000, 1000, 1000], center=true);
          }
        }
      }
    }
  }
}
